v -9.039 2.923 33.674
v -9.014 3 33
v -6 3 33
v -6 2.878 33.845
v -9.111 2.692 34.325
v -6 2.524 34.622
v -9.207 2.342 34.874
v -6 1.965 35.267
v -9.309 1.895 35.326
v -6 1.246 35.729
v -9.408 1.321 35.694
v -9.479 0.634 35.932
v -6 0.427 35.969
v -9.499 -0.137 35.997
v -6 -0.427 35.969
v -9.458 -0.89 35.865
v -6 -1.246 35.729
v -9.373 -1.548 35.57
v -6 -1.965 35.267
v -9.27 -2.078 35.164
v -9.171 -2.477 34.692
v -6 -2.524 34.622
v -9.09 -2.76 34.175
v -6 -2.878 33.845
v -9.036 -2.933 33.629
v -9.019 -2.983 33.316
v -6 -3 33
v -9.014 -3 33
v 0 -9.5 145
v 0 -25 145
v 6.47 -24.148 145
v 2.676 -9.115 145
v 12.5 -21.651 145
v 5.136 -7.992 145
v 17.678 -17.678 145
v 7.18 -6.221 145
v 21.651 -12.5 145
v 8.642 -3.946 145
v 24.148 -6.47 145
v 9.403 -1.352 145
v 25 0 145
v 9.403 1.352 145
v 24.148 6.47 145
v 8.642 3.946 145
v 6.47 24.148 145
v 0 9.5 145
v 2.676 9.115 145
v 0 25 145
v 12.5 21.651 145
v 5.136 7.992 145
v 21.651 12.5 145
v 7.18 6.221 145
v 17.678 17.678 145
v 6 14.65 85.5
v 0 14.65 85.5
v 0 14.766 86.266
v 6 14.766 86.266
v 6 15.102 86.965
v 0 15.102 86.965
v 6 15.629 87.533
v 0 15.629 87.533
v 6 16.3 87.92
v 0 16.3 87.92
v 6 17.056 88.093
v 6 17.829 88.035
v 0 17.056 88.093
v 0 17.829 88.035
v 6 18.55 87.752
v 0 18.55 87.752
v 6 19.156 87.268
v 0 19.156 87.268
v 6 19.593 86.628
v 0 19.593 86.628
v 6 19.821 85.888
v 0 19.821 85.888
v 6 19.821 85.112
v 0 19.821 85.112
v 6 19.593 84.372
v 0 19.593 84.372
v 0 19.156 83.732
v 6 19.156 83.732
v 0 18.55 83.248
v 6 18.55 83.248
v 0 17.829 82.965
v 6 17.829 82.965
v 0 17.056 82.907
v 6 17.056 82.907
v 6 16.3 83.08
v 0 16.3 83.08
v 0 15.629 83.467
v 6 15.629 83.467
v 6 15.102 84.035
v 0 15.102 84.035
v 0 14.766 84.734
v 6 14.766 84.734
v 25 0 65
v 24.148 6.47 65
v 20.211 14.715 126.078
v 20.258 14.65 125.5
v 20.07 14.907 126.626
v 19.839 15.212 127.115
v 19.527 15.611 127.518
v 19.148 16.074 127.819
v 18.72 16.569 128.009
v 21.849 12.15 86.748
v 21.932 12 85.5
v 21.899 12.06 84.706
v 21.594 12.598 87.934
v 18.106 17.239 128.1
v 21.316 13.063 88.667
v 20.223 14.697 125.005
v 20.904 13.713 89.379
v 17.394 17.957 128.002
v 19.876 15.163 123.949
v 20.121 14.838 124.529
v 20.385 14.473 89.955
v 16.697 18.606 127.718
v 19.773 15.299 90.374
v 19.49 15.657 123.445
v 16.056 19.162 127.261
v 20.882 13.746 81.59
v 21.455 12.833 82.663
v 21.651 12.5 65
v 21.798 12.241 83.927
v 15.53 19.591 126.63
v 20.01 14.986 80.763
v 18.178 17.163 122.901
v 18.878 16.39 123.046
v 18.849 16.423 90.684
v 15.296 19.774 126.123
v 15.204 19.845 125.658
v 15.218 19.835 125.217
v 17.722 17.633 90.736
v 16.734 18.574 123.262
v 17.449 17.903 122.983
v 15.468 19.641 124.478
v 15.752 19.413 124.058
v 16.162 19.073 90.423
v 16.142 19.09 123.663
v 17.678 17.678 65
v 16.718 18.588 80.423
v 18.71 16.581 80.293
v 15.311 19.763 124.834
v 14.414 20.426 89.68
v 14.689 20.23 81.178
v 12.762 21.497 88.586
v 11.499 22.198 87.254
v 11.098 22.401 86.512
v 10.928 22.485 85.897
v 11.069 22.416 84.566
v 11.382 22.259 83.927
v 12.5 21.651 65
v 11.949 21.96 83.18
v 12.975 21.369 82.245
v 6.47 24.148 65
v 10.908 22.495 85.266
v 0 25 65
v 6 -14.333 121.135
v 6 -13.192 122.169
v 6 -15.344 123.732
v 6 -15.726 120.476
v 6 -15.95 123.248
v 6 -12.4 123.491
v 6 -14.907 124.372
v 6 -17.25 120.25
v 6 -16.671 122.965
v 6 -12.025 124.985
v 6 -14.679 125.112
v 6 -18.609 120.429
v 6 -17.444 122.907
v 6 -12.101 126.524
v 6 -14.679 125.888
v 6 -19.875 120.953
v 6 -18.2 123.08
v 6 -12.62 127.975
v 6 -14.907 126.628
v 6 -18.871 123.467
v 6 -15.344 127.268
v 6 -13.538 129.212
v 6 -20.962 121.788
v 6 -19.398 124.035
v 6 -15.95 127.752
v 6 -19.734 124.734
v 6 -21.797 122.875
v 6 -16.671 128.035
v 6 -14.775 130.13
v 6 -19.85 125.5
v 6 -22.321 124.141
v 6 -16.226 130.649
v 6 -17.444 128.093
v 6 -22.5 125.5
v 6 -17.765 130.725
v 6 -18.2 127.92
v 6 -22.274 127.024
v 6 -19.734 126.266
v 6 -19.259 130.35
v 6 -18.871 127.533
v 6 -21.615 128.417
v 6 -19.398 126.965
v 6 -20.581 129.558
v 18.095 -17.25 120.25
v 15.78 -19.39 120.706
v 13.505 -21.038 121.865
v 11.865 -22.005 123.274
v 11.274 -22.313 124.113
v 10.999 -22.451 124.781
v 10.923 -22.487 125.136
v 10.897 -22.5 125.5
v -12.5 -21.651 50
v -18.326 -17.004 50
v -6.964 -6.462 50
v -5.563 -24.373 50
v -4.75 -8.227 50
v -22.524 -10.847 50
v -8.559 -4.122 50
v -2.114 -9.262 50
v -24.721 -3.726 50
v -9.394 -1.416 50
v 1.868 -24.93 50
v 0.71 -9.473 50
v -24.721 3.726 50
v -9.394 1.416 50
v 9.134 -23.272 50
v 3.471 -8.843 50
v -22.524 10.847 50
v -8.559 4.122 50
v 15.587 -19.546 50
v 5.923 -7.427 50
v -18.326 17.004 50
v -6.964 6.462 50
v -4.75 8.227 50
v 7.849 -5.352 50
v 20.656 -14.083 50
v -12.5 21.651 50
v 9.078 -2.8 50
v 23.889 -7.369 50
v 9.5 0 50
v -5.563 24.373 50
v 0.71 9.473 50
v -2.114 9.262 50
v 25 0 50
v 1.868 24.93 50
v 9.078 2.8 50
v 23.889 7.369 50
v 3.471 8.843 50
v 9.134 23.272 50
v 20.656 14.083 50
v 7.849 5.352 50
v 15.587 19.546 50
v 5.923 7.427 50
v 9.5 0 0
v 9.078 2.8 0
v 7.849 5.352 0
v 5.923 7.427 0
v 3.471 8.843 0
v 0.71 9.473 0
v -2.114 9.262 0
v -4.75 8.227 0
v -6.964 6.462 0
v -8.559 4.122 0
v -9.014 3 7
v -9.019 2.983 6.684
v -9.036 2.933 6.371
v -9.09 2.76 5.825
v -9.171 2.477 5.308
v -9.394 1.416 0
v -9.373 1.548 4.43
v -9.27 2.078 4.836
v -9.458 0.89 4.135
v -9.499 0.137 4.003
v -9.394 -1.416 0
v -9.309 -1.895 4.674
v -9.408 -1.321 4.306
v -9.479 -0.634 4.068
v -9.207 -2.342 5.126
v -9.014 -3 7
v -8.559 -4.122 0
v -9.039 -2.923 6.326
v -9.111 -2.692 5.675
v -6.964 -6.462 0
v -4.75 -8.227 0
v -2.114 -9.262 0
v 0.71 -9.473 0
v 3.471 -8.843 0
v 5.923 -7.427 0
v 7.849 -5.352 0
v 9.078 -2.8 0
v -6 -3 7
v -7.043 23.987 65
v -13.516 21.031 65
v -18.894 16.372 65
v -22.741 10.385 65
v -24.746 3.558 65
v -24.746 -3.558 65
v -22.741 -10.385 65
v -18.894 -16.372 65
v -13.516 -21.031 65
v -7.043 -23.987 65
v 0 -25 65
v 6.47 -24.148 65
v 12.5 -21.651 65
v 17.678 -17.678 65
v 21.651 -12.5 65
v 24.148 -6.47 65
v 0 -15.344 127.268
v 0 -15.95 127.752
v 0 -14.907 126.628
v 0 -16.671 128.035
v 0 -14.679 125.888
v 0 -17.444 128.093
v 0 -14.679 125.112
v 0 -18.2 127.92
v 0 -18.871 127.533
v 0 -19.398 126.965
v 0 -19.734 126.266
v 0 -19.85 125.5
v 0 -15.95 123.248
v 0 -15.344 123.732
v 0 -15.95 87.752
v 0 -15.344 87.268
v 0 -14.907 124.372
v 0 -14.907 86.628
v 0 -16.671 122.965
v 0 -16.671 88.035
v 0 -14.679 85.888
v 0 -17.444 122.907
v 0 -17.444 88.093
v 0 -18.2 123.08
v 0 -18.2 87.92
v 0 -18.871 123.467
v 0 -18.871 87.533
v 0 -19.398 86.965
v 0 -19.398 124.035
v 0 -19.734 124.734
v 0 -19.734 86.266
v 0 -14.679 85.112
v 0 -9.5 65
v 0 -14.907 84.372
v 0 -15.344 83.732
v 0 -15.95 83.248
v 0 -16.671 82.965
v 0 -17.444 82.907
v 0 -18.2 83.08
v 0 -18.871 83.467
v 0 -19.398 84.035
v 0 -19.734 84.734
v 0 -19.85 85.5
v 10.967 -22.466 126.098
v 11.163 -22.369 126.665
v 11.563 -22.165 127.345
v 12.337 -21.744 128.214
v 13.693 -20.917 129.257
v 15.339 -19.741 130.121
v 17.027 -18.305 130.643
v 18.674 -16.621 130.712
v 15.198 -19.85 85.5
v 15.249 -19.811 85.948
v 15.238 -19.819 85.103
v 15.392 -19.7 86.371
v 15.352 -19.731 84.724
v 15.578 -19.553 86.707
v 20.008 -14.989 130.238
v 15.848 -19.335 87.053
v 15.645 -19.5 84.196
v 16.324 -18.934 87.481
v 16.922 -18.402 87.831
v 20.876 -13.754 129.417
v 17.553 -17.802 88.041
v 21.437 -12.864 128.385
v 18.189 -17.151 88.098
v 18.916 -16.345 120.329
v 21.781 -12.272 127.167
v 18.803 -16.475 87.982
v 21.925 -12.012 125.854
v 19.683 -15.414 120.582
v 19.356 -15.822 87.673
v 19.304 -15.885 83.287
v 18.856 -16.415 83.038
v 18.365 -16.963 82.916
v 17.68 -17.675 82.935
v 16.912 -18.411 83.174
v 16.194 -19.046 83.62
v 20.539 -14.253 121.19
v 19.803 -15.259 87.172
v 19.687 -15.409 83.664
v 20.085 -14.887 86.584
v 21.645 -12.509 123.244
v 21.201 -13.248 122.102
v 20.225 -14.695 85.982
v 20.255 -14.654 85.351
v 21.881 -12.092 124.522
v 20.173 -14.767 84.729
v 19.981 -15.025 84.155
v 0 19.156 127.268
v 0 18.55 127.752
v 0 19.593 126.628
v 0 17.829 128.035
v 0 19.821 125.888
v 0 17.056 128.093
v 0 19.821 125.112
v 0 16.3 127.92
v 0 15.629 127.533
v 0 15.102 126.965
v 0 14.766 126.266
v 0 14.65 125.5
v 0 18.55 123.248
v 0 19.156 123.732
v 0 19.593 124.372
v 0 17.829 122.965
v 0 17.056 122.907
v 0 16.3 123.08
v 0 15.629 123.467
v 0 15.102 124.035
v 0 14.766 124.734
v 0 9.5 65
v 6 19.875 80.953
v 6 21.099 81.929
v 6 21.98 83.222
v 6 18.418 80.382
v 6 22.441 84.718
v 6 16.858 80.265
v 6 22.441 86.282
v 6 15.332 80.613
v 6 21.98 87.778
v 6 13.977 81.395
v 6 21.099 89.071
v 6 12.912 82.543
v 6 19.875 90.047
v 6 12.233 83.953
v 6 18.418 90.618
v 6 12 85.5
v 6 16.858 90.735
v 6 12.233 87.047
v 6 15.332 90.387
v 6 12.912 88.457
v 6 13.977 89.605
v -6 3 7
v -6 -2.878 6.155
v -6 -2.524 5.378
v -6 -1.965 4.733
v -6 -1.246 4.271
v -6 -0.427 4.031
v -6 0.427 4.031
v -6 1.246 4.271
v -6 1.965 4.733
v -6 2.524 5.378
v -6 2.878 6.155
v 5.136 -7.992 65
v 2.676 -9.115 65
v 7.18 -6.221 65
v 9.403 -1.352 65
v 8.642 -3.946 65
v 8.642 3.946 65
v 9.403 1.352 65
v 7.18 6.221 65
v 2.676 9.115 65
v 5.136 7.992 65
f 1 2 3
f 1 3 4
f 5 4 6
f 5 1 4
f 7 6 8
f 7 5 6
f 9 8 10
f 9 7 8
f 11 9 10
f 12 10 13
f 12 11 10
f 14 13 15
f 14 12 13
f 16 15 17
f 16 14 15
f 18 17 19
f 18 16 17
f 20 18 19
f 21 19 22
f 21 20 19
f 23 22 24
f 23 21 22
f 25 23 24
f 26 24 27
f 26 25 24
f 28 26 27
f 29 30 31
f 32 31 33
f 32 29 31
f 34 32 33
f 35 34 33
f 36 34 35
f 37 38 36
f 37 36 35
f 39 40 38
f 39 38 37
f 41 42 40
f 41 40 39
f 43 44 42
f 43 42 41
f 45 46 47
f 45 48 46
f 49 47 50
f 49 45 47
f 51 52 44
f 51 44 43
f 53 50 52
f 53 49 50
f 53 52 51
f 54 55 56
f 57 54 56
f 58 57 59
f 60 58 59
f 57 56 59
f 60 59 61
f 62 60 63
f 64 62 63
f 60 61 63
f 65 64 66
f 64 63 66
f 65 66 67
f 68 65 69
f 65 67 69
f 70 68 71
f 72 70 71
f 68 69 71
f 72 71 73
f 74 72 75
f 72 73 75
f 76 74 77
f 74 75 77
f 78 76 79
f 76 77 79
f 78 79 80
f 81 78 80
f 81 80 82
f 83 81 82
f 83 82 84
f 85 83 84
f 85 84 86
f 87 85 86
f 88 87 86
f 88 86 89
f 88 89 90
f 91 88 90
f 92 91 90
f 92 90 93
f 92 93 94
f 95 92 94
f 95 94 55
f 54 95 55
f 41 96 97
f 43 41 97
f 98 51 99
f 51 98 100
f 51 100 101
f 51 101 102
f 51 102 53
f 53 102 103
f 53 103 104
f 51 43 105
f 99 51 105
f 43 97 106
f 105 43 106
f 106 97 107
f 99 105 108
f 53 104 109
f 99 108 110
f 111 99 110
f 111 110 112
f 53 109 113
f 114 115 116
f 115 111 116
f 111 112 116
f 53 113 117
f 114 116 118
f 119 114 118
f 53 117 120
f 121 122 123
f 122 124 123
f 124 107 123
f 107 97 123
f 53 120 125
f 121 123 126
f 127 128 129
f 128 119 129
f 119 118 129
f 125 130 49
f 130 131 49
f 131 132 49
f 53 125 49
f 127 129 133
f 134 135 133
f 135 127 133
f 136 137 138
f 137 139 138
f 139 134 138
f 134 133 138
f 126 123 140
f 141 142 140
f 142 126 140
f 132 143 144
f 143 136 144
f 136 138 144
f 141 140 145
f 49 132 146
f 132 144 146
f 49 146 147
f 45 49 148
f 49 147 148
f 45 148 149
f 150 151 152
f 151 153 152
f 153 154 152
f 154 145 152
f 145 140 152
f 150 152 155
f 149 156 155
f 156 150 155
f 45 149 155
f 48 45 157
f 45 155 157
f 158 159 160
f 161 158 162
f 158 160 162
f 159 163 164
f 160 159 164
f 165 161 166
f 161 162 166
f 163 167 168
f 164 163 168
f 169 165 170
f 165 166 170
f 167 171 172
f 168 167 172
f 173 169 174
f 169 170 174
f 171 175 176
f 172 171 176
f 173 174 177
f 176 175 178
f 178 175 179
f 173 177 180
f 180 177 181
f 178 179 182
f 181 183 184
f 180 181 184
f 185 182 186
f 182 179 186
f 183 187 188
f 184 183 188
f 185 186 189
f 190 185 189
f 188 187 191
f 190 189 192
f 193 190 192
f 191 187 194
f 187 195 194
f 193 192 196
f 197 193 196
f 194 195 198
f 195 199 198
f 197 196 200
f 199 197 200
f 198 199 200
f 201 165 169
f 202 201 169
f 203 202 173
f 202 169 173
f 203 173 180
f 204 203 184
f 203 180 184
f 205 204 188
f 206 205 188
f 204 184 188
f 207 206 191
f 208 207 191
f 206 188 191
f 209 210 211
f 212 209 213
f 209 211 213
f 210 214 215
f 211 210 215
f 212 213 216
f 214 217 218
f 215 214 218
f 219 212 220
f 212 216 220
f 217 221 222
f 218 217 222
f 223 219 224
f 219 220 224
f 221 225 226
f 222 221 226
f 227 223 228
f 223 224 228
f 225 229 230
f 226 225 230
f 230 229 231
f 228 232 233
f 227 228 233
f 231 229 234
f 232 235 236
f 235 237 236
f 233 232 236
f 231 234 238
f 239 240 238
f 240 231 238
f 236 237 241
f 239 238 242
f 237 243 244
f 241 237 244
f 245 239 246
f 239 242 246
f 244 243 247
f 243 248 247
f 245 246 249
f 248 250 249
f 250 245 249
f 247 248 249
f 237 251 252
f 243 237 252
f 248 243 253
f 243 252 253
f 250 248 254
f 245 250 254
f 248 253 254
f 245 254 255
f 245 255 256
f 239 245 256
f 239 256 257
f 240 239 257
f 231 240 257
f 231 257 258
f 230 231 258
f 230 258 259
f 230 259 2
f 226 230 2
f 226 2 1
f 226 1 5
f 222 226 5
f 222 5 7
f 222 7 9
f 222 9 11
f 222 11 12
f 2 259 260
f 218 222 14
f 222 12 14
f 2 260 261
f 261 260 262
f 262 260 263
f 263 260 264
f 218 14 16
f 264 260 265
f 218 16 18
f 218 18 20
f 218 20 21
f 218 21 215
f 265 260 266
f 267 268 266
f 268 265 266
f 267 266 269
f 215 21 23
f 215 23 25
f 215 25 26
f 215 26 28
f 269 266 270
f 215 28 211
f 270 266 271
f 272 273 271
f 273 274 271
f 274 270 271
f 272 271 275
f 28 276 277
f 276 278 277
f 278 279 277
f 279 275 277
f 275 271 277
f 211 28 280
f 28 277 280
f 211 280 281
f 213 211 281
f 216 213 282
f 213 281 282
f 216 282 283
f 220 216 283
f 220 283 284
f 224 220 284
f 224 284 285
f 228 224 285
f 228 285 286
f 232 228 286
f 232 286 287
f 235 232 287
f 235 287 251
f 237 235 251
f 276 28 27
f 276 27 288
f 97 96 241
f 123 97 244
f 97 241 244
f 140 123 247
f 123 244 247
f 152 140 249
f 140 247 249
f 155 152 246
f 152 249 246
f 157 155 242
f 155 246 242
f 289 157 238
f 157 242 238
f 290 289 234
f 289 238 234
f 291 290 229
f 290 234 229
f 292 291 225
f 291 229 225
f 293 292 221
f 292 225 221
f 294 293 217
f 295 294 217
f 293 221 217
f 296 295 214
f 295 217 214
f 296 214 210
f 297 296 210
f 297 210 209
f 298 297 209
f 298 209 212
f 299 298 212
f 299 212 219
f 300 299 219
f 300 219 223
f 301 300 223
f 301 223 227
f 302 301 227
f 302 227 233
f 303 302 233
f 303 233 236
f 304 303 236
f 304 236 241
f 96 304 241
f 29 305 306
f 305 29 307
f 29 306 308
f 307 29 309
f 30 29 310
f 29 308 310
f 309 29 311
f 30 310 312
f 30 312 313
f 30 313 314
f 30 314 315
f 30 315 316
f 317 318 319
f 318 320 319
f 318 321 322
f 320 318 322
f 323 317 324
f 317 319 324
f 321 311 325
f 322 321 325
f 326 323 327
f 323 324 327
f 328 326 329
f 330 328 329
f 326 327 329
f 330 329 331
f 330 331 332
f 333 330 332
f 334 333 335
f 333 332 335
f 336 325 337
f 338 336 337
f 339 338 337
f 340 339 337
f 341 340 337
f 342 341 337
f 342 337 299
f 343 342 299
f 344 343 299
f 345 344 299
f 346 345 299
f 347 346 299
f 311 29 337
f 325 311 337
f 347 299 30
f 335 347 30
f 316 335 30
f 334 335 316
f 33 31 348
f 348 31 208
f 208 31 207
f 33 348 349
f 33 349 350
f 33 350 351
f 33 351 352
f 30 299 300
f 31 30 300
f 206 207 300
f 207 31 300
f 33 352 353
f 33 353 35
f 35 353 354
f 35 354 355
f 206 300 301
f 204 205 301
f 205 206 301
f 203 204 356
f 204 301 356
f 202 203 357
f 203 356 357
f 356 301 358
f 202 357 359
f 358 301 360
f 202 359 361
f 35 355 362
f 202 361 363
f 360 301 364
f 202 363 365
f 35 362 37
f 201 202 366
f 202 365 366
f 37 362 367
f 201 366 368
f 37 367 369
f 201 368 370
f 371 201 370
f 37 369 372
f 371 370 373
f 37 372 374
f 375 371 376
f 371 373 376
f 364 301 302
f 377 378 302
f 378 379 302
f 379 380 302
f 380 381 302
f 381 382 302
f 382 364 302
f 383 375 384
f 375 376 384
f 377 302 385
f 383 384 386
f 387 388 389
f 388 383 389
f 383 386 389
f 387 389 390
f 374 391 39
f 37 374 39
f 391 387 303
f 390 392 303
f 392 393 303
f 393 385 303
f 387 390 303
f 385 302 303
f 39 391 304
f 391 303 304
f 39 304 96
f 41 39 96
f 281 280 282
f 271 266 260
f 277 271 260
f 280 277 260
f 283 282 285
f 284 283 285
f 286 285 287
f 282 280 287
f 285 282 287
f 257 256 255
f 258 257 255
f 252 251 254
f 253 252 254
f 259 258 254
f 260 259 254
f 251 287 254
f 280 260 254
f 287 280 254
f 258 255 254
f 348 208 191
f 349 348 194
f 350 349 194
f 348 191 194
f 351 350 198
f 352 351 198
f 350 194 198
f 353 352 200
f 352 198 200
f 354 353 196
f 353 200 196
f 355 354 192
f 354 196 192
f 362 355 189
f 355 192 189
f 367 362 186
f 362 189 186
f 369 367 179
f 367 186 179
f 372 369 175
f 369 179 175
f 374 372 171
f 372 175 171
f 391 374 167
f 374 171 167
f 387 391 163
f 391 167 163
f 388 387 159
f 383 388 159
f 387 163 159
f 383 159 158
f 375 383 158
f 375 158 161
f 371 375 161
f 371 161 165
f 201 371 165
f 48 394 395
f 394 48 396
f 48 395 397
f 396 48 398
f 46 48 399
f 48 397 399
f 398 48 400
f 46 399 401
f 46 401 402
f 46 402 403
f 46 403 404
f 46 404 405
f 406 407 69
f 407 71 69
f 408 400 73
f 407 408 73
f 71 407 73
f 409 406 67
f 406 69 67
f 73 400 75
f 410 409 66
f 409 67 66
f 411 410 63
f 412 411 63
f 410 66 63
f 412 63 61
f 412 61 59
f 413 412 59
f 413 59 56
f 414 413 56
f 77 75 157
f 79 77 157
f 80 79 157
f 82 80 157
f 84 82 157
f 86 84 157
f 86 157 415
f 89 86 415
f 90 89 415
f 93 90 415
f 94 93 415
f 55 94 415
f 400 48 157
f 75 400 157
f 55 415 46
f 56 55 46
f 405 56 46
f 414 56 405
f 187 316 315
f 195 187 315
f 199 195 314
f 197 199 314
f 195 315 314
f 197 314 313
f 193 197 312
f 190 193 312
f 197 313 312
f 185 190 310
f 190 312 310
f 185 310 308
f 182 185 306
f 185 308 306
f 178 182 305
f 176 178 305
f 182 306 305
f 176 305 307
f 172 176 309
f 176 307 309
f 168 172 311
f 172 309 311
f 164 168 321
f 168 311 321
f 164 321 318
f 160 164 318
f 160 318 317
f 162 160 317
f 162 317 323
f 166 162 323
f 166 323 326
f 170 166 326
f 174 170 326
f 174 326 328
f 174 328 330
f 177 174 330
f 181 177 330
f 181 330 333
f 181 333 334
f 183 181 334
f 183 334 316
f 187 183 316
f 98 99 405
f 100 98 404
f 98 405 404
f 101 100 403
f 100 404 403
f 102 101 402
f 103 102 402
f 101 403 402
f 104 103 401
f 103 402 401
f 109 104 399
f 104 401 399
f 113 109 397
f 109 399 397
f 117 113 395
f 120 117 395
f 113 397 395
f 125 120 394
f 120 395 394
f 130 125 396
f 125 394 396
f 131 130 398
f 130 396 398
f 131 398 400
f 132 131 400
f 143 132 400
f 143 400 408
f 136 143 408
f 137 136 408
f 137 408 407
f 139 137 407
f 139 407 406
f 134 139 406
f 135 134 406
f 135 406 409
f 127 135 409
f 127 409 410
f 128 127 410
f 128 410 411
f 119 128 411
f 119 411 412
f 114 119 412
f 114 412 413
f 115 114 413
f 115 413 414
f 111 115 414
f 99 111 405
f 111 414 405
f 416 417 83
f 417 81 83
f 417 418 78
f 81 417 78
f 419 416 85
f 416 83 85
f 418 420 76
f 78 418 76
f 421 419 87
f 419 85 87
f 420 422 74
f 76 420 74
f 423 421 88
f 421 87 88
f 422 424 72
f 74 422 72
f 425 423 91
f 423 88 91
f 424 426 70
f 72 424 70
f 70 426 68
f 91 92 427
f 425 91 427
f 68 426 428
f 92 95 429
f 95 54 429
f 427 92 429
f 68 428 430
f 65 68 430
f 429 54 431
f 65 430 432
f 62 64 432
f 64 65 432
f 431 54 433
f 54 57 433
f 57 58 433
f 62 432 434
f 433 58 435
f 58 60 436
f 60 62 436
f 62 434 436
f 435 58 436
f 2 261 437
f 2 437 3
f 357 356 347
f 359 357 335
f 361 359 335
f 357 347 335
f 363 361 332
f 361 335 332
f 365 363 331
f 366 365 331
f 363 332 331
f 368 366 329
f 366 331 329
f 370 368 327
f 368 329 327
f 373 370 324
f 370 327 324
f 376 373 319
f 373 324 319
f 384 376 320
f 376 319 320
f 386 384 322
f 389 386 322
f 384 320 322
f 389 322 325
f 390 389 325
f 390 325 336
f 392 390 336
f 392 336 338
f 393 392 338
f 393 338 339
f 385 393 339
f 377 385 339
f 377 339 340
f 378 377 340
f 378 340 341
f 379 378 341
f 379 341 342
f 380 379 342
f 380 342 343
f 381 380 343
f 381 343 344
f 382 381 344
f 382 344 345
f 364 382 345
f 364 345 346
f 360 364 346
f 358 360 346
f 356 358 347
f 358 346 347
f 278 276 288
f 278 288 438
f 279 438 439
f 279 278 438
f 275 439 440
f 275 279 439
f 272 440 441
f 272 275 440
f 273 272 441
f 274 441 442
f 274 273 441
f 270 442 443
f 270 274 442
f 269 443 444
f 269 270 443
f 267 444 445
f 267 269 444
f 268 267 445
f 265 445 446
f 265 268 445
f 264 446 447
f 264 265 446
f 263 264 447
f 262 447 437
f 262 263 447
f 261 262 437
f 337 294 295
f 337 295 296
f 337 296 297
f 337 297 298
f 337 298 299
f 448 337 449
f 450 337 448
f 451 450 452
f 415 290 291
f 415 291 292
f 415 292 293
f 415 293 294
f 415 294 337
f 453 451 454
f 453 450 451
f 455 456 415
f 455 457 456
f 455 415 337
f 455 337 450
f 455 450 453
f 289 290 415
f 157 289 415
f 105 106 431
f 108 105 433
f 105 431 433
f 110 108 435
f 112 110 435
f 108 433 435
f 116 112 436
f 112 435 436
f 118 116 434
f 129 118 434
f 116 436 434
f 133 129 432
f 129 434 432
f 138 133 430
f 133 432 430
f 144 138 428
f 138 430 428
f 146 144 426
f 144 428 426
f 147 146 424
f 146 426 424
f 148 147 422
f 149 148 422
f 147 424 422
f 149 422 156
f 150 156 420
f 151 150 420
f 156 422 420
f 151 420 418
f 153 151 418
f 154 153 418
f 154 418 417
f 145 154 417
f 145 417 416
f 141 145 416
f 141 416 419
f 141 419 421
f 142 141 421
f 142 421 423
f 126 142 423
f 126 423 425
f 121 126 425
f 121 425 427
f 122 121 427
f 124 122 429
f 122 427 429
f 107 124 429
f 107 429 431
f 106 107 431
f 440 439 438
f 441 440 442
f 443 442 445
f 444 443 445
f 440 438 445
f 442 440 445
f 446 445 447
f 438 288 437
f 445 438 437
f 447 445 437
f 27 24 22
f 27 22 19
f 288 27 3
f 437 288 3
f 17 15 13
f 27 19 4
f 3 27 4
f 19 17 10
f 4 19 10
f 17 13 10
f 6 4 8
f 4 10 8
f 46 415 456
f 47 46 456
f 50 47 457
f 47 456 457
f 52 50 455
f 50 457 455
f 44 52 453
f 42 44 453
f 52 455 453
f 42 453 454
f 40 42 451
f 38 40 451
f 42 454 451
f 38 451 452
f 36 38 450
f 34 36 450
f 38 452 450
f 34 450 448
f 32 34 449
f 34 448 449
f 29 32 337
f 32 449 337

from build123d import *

# Parameters (mm, degrees)
F0_R      = 9.5
F1_DEPTH  = 50
F2_R      = 25
F3_DEPTH  = 15
F5_DEPTH  = 80
F6_R      = 2.6
F7_DEPTH  = 25.001
F9_R      = 5.25
F10_DEPTH = 25
F13_DEPTH = 3.5


with BuildPart() as f1:
    # F0 (on Top) → F1 (new body)
    with BuildSketch(Plane.XY):
        Circle(F0_R)
    extrude(amount=F1_DEPTH)

    # F2 (on face) → F3 (join)
    with BuildSketch(Plane.XY.offset(50)):
        Circle(F2_R)
    extrude(amount=F3_DEPTH)

    # F4 (on face) → F5 (join)
    with BuildSketch(Plane.XY.offset(65)):
        with BuildLine():
            ThreePointArc((0, 9.5), (9.5, 0), (0, -9.5))
            Line((0, -9.5), (0, -25))
            ThreePointArc((0, -25), (17.6776695297, -17.6776695297), (25, 0))
            ThreePointArc((25, 0), (17.6776695297, 17.6776695297), (0, 25))
            Line((0, 25), (0, 9.5))
        make_face()
    extrude(amount=F5_DEPTH)

    # F6 (on face) → F7 (cut, through all)
    with BuildSketch(Plane(origin=(0, 0, 0), x_dir=(0, -1, 0), z_dir=(-1, 0, 0))):
        with Locations((17.25, 85.5)):
            Circle(F6_R)
        with Locations((17.25, 125.5)):
            Circle(F6_R)
        with Locations((-17.25, 125.5)):
            Circle(F6_R)
        with Locations((-17.25, 85.5)):
            Circle(F6_R)
    extrude(amount=-F7_DEPTH, mode=Mode.SUBTRACT)

    # F9 (on offset) → F10 (cut)
    with BuildSketch(Plane(origin=(6, 0, 0), x_dir=(0, -1, 0), z_dir=(-1, 0, 0))):
        with BuildLine():
            ThreePointArc((17.25, 120.25), (20.9623106012, 121.7876893988), (22.5, 125.5))
            ThreePointArc((22.5, 125.5), (13.5376893988, 129.2123106012), (17.25, 120.25))
        make_face()
        with Locations((-17.25, 85.5)):
            Circle(F9_R)
    extrude(amount=-F10_DEPTH, mode=Mode.SUBTRACT)

    # F12 (on offset) → F13 (cut)
    with BuildSketch(Plane.YZ.offset(-9.5)):
        with BuildLine():
            Line((-3, 33), (-3, 7))
            ThreePointArc((-3, 7), (0, 4), (3, 7))
            Line((3, 7), (3, 33))
            ThreePointArc((3, 33), (0, 36), (-3, 33))
        make_face()
    extrude(amount=F13_DEPTH, mode=Mode.SUBTRACT)


solid = f1.part
